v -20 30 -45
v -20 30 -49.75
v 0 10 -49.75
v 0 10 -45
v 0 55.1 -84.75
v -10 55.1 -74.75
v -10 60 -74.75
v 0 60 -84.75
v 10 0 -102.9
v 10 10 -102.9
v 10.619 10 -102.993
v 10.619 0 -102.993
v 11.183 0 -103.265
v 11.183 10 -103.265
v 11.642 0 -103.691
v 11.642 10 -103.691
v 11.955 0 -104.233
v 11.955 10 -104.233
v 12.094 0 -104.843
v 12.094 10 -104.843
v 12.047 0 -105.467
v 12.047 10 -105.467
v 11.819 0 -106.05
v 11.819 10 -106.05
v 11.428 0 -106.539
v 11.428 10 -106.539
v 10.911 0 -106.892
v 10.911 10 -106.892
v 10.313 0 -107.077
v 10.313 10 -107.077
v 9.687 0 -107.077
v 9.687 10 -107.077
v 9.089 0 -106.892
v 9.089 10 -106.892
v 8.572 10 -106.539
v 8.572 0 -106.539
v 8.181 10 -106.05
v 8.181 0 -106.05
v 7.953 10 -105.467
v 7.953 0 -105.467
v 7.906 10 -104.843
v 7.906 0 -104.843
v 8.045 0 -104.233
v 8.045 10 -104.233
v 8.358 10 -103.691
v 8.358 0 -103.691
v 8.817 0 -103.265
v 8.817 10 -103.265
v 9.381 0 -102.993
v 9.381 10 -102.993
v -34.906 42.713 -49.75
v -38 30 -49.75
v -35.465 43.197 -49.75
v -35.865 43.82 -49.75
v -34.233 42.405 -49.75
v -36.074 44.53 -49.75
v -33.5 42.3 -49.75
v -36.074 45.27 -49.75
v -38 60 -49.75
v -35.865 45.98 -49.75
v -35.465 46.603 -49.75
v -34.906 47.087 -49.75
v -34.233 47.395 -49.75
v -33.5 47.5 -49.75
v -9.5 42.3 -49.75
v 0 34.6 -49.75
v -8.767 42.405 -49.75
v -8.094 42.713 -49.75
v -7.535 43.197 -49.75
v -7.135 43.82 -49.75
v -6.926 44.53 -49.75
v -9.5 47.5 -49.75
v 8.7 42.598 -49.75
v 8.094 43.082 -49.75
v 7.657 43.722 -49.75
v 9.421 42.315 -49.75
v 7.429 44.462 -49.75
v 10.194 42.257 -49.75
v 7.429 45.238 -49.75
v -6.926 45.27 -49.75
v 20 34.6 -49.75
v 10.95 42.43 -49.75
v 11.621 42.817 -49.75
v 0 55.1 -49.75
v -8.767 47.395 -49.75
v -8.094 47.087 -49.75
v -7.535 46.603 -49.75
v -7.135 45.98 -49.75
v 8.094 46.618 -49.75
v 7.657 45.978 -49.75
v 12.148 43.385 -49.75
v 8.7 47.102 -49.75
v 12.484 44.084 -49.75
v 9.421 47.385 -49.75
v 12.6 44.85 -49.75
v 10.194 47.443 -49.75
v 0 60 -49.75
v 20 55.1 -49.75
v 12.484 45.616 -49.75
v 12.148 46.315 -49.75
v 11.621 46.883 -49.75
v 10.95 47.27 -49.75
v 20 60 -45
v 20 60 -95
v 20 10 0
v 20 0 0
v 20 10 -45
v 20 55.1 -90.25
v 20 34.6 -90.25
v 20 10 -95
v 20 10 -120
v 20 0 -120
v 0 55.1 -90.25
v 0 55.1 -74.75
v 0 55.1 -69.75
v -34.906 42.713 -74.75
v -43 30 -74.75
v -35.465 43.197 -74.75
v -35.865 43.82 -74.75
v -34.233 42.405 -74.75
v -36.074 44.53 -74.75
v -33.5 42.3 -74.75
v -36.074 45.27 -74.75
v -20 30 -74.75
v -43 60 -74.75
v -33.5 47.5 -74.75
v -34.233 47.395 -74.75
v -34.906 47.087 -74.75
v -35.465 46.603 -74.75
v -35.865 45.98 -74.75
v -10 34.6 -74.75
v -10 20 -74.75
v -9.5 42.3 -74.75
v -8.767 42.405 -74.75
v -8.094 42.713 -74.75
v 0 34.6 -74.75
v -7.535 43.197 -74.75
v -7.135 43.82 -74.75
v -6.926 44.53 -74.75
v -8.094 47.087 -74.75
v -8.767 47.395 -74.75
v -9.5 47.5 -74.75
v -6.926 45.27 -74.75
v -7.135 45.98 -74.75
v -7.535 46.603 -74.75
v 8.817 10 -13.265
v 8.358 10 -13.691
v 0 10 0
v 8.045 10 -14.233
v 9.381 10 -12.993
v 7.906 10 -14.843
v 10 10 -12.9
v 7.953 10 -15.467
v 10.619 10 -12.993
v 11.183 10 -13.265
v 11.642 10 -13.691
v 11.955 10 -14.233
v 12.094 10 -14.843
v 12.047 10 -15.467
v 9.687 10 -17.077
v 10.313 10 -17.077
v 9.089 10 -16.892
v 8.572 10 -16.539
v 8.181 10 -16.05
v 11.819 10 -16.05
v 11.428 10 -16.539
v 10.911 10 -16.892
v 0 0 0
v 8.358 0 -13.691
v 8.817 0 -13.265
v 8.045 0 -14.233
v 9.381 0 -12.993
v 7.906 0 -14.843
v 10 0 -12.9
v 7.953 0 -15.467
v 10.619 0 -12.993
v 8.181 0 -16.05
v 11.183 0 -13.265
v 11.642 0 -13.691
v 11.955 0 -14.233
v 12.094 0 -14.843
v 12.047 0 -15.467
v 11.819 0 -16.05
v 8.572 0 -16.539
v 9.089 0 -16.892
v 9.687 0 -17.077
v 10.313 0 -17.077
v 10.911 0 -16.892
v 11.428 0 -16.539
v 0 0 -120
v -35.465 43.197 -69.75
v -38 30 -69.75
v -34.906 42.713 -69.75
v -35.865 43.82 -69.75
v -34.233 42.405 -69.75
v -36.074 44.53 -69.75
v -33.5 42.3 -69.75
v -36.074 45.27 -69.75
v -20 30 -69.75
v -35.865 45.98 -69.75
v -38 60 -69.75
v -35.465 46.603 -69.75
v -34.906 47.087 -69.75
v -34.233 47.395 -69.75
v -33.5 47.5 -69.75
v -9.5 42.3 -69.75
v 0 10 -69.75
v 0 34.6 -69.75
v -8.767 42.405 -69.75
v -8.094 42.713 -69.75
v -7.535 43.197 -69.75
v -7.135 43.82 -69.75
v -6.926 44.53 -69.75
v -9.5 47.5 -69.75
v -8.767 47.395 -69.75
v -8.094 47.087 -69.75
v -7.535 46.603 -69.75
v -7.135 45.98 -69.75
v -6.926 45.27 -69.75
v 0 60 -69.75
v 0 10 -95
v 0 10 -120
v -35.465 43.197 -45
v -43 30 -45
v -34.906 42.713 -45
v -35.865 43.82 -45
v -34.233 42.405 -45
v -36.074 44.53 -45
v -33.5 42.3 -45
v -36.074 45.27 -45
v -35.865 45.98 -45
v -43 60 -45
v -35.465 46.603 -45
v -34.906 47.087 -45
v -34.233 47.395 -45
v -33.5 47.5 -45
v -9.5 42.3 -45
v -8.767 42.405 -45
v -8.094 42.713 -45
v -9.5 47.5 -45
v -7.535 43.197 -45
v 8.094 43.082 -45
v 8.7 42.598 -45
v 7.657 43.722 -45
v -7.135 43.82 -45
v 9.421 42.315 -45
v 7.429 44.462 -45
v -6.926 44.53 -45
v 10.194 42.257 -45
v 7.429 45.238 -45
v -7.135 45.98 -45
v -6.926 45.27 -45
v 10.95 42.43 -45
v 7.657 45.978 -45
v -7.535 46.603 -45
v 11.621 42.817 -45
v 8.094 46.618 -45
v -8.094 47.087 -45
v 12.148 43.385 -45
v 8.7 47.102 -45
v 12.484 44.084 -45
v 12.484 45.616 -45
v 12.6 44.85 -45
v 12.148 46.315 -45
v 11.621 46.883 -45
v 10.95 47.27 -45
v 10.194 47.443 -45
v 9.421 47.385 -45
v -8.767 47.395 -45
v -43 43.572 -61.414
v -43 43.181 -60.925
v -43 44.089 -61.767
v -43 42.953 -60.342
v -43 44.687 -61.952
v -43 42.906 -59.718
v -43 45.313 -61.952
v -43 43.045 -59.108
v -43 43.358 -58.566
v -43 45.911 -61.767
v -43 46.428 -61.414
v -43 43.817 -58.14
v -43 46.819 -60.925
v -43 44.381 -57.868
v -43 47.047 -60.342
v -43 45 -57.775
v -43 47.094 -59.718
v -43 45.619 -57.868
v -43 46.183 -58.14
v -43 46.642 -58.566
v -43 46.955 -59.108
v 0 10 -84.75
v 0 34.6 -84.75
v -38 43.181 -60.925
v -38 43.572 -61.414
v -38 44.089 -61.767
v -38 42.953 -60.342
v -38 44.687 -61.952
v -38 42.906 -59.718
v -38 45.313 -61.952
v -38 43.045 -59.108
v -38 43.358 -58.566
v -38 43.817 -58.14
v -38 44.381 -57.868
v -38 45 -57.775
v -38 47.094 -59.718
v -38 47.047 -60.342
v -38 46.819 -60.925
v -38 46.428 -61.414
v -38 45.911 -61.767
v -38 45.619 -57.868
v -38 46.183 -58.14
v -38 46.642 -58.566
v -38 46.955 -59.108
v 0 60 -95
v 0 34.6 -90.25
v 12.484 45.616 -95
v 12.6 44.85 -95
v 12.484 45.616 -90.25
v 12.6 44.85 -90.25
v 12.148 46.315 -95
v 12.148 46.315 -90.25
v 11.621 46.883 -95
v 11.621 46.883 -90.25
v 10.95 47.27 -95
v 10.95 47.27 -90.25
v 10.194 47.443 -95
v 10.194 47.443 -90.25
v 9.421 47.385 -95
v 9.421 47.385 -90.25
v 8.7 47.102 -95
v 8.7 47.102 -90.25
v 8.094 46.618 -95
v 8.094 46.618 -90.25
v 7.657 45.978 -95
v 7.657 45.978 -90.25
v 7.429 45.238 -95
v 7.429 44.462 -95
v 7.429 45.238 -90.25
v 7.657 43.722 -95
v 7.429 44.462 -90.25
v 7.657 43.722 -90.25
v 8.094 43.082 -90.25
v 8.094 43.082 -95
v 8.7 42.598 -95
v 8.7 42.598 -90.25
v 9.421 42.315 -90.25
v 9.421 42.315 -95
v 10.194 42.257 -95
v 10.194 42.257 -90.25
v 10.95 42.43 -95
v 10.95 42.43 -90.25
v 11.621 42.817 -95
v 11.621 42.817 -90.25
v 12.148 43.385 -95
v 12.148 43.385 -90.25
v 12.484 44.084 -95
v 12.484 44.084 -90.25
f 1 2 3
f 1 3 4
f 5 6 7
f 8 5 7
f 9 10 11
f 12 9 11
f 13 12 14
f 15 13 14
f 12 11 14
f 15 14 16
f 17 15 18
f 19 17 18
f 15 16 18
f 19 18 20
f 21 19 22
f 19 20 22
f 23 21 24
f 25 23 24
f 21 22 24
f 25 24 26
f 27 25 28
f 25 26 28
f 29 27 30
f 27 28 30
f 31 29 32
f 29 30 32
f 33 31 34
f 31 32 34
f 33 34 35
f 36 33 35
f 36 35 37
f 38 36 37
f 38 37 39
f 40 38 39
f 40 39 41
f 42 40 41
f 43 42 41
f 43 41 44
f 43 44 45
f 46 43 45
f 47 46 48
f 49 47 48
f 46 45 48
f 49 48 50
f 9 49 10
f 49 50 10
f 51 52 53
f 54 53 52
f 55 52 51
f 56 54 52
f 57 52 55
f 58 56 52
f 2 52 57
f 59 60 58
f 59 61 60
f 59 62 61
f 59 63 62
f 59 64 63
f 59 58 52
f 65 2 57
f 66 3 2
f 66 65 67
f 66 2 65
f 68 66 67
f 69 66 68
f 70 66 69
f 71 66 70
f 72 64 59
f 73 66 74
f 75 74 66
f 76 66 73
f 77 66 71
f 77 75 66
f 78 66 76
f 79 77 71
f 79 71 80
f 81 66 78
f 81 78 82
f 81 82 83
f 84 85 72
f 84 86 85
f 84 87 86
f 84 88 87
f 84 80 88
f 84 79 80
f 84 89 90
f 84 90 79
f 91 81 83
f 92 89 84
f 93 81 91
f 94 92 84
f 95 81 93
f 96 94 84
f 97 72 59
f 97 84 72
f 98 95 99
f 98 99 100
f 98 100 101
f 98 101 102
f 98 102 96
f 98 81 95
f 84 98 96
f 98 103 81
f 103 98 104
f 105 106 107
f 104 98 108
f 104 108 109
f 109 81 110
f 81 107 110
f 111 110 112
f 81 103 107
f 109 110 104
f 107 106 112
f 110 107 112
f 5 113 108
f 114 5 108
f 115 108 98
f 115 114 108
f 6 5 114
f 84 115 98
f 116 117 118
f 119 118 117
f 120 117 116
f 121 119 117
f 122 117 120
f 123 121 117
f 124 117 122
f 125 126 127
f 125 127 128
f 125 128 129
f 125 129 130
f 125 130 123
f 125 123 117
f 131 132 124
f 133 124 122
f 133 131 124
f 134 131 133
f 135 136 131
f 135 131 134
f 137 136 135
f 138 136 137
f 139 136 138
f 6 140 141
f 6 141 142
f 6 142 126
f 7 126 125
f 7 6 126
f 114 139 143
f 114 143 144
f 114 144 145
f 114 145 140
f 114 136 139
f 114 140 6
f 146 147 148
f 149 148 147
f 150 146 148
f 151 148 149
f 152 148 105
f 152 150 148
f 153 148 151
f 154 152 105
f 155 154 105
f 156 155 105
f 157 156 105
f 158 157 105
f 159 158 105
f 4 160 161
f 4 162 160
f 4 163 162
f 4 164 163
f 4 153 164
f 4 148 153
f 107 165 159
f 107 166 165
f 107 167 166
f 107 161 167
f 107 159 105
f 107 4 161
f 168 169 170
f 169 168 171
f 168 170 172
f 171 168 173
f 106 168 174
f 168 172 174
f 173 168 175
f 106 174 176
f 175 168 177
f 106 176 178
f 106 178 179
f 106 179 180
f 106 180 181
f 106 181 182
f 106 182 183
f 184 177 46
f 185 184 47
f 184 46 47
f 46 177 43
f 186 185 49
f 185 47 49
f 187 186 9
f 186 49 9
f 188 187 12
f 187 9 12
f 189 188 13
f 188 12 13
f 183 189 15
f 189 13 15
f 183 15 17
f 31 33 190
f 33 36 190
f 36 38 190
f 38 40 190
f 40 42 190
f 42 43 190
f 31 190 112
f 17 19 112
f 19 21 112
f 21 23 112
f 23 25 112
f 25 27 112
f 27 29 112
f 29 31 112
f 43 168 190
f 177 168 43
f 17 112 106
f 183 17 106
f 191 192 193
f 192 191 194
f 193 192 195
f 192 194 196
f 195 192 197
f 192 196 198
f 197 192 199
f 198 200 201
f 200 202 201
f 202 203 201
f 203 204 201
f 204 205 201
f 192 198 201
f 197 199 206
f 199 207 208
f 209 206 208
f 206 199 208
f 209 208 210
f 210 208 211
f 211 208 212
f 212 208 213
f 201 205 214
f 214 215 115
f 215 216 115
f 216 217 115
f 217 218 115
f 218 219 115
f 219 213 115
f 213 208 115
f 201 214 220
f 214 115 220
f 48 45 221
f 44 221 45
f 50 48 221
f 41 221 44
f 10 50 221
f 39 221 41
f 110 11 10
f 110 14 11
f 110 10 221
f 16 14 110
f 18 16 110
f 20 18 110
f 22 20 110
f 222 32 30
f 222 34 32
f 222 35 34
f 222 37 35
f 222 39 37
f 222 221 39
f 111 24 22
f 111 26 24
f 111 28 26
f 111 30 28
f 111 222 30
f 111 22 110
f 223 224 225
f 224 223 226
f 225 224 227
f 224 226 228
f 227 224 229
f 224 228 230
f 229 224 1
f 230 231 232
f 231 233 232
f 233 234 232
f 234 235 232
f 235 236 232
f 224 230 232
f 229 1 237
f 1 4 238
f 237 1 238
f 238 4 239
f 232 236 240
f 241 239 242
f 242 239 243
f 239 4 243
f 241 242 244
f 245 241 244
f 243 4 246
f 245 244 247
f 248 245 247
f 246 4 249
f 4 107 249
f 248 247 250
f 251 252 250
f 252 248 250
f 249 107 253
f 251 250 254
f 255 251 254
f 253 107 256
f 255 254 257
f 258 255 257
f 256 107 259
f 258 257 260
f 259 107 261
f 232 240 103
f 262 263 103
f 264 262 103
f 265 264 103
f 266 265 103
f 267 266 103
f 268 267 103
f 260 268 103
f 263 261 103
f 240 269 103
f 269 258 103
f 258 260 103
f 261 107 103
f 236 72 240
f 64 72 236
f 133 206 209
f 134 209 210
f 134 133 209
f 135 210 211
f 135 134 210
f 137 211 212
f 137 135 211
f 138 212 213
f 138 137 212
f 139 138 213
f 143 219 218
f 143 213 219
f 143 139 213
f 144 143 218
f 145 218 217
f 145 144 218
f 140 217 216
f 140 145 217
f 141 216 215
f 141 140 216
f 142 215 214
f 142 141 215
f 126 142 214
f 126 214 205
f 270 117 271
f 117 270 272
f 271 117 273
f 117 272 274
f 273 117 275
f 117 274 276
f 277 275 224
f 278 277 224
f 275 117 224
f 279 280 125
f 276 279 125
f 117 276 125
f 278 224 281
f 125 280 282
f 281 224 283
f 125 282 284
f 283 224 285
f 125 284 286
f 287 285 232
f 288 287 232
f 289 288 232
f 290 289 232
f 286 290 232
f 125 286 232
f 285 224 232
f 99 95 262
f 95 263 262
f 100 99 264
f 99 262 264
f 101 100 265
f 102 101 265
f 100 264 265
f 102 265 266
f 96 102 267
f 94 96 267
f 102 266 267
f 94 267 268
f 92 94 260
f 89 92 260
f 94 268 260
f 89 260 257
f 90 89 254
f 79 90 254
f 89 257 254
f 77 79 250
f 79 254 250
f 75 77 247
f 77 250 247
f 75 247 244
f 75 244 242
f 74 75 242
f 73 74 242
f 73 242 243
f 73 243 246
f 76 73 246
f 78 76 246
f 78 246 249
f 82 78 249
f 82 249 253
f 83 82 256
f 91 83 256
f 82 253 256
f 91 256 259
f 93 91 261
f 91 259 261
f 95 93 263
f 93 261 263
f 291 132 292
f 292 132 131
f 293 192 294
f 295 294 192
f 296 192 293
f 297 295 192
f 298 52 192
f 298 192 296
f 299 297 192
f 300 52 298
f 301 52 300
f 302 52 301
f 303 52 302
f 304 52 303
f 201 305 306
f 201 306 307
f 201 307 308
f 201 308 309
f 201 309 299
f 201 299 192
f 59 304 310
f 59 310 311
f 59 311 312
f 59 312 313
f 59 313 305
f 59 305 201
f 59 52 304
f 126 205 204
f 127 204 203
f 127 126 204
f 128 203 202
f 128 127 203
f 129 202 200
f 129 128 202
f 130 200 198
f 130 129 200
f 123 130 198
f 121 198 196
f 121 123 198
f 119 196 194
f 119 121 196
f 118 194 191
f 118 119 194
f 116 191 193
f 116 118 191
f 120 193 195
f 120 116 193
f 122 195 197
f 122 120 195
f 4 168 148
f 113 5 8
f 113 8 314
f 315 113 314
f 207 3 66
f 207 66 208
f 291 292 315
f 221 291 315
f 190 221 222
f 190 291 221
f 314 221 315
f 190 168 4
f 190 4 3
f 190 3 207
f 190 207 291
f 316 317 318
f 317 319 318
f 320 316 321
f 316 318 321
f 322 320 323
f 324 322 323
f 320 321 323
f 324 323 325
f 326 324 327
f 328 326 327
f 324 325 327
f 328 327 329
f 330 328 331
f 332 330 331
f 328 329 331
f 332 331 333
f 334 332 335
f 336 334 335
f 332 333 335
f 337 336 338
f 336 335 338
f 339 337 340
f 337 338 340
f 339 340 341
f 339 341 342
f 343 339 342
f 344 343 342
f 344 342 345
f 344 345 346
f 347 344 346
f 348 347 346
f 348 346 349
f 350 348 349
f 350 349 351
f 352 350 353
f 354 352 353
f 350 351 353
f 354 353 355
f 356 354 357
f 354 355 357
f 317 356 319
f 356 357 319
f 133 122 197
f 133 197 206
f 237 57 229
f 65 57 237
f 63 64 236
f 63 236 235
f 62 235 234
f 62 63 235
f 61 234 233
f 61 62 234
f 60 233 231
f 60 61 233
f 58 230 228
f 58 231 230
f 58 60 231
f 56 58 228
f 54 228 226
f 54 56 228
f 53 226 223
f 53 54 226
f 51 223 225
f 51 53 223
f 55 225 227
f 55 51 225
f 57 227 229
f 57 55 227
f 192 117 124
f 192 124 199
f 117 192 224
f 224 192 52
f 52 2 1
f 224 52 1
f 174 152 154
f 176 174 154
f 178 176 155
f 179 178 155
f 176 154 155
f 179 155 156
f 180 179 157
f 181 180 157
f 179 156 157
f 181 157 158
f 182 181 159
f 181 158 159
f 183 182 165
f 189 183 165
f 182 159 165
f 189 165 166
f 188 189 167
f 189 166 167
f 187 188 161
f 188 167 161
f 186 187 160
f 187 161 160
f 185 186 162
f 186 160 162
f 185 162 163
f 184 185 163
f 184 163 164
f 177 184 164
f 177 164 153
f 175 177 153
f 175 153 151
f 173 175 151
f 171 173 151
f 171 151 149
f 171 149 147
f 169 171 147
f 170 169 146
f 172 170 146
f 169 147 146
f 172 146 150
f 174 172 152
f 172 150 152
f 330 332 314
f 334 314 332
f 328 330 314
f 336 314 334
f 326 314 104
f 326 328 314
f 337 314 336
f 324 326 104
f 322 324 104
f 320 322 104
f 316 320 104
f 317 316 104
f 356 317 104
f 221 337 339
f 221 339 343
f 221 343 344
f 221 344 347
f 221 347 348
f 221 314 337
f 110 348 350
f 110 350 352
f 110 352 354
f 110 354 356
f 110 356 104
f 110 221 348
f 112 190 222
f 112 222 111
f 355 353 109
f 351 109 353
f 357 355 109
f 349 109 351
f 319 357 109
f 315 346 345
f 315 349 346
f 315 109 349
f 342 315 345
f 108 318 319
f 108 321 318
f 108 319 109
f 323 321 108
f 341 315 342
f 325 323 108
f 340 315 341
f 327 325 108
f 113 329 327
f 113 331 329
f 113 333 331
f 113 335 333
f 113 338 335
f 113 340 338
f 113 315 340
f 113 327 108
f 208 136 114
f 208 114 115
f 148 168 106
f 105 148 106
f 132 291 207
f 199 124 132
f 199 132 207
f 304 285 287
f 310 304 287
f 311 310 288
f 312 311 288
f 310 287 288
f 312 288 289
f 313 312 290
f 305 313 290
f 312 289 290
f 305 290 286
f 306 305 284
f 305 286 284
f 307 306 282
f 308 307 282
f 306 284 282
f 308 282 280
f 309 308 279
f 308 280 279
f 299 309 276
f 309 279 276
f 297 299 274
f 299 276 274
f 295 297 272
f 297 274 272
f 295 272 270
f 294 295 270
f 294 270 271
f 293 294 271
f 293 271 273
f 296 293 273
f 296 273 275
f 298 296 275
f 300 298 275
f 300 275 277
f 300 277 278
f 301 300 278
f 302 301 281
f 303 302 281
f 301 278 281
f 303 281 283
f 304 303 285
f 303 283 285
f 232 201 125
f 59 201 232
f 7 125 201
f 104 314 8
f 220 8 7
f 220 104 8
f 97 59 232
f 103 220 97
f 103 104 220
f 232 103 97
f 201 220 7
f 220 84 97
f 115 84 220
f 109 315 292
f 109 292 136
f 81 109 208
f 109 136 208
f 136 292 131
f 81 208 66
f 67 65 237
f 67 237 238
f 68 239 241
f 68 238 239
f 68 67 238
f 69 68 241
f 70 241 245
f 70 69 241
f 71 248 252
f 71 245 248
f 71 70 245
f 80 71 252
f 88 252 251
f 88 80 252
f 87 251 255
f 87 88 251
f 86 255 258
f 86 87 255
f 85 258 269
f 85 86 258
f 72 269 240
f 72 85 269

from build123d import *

# Parameters (mm, degrees)
SKETCH4_W           = 20
SKETCH4_H           = 120
BOSS_EXTRUDE4_DEPTH = 10
SKETCH5_R           = 2.1
CUT_EXTRUDE1_DEPTH  = 10
SKETCH6_W           = 20
SKETCH6_H           = 50
BOSS_EXTRUDE5_DEPTH = 50
SKETCH7_W           = 40.5
SKETCH7_H           = 20.5
CUT_EXTRUDE2_DEPTH  = 20
SKETCH8_R           = 2.6
CUT_EXTRUDE3_DEPTH  = 50
SKETCH9_W           = 4.75
SKETCH9_H           = 30
SKETCH9_W_2         = 5
BOSS_EXTRUDE6_DEPTH = 40
CUT_EXTRUDE4_DEPTH  = 40
BOSS_EXTRUDE7_START = -29.75
SKETCH11_W          = 5
SKETCH11_H          = 30
BOSS_EXTRUDE7_DEPTH = 29.75
SKETCH12_R          = 2.1
CUT_EXTRUDE5_DEPTH  = 5
CHAMFER1_SIZE       = 20
CHAMFER2_SIZE       = 10


with BuildPart() as part:
    # Sketch4 → Boss-Extrude4 (new body)
    with BuildSketch(Plane(origin=(0, 0, 0), x_dir=(1, 0, 0), z_dir=(0, 1, 0))):
        with Locations((10, 60)):
            Rectangle(SKETCH4_W, SKETCH4_H)
    extrude(amount=BOSS_EXTRUDE4_DEPTH)

    # Sketch5 → Cut-Extrude1 (cut)
    with BuildSketch(Plane(origin=(0, 10, 0), x_dir=(1, 0, 0), z_dir=(0, 1, 0))):
        with Locations(Location((10, 105, 0), (0, 0, 270))):
            Circle(SKETCH5_R)
        with Locations(Location((10, 15, 0), (0, 0, 270))):
            Circle(SKETCH5_R)
    extrude(amount=-CUT_EXTRUDE1_DEPTH, mode=Mode.SUBTRACT)

    # Sketch6 → Boss-Extrude5 (add)
    with BuildSketch(Plane(origin=(0, 10, 0), x_dir=(1, 0, 0), z_dir=(0, 1, 0))):
        with Locations((10, 70)):
            Rectangle(SKETCH6_W, SKETCH6_H)
    extrude(amount=BOSS_EXTRUDE5_DEPTH)

    # Sketch7 → Cut-Extrude2 (cut)
    with BuildSketch(Plane.ZY):
        with Locations((-70, 44.85)):
            Rectangle(SKETCH7_W, SKETCH7_H)
    extrude(amount=-CUT_EXTRUDE2_DEPTH, mode=Mode.SUBTRACT)

    # Sketch8 → Cut-Extrude3 (cut, symmetric)
    with BuildSketch(Plane.XY.offset(-90.25)):
        with Locations((10, 44.85)):
            Circle(SKETCH8_R)
    extrude(amount=CUT_EXTRUDE3_DEPTH, both=True, mode=Mode.SUBTRACT)

    # Sketch9 → Boss-Extrude6 (add)
    with BuildSketch(Plane.ZY):
        with Locations((-47.375, 45)):
            Rectangle(SKETCH9_W, SKETCH9_H)
        with Locations((-72.25, 45)):
            Rectangle(SKETCH9_W_2, SKETCH9_H)
    extrude(amount=BOSS_EXTRUDE6_DEPTH)

    # Sketch10 → Cut-Extrude4 (cut)
    with BuildSketch(Plane(origin=(0, 0, -74.75), x_dir=(-1, 0, 0), z_dir=(0, 0, -1))):
        with BuildLine():
            Line((33.5, 42.3), (9.5, 42.3))
            ThreePointArc((9.5, 42.3), (6.9, 44.9), (9.5, 47.5))
            Line((9.5, 47.5), (33.5, 47.5))
            ThreePointArc((33.5, 47.5), (36.1, 44.9), (33.5, 42.3))
        make_face()
    extrude(amount=-CUT_EXTRUDE4_DEPTH, mode=Mode.SUBTRACT)

    # Sketch11 → Boss-Extrude7 (add)
    with BuildSketch(Plane(origin=(0, 0, -74.75), x_dir=(-1, 0, 0), z_dir=(0, 0, -1)).offset(BOSS_EXTRUDE7_START)):
        with Locations((40.5, 45)):
            Rectangle(SKETCH11_W, SKETCH11_H)
    extrude(amount=BOSS_EXTRUDE7_DEPTH)

    # Sketch12 → Cut-Extrude5 (cut)
    with BuildSketch(Plane.ZY.offset(43)):
        with Locations((-59.875, 45)):
            Circle(SKETCH12_R)
    extrude(amount=-CUT_EXTRUDE5_DEPTH, mode=Mode.SUBTRACT)

    # Chamfer1
    chamfer1_edges = [part.edges().sort_by_distance(p)[0] for p in [
        (0, 30, -47.375),
        (0, 30, -72.25),
    ]]
    chamfer(chamfer1_edges, length=CHAMFER1_SIZE)

    # Chamfer2
    chamfer2_edges = [part.edges().sort_by_distance(p)[0] for p in [
        (0, 57.55, -74.75),
        (0, 22.3, -74.75),
    ]]
    chamfer(chamfer2_edges, length=CHAMFER2_SIZE)


solid = part.part
